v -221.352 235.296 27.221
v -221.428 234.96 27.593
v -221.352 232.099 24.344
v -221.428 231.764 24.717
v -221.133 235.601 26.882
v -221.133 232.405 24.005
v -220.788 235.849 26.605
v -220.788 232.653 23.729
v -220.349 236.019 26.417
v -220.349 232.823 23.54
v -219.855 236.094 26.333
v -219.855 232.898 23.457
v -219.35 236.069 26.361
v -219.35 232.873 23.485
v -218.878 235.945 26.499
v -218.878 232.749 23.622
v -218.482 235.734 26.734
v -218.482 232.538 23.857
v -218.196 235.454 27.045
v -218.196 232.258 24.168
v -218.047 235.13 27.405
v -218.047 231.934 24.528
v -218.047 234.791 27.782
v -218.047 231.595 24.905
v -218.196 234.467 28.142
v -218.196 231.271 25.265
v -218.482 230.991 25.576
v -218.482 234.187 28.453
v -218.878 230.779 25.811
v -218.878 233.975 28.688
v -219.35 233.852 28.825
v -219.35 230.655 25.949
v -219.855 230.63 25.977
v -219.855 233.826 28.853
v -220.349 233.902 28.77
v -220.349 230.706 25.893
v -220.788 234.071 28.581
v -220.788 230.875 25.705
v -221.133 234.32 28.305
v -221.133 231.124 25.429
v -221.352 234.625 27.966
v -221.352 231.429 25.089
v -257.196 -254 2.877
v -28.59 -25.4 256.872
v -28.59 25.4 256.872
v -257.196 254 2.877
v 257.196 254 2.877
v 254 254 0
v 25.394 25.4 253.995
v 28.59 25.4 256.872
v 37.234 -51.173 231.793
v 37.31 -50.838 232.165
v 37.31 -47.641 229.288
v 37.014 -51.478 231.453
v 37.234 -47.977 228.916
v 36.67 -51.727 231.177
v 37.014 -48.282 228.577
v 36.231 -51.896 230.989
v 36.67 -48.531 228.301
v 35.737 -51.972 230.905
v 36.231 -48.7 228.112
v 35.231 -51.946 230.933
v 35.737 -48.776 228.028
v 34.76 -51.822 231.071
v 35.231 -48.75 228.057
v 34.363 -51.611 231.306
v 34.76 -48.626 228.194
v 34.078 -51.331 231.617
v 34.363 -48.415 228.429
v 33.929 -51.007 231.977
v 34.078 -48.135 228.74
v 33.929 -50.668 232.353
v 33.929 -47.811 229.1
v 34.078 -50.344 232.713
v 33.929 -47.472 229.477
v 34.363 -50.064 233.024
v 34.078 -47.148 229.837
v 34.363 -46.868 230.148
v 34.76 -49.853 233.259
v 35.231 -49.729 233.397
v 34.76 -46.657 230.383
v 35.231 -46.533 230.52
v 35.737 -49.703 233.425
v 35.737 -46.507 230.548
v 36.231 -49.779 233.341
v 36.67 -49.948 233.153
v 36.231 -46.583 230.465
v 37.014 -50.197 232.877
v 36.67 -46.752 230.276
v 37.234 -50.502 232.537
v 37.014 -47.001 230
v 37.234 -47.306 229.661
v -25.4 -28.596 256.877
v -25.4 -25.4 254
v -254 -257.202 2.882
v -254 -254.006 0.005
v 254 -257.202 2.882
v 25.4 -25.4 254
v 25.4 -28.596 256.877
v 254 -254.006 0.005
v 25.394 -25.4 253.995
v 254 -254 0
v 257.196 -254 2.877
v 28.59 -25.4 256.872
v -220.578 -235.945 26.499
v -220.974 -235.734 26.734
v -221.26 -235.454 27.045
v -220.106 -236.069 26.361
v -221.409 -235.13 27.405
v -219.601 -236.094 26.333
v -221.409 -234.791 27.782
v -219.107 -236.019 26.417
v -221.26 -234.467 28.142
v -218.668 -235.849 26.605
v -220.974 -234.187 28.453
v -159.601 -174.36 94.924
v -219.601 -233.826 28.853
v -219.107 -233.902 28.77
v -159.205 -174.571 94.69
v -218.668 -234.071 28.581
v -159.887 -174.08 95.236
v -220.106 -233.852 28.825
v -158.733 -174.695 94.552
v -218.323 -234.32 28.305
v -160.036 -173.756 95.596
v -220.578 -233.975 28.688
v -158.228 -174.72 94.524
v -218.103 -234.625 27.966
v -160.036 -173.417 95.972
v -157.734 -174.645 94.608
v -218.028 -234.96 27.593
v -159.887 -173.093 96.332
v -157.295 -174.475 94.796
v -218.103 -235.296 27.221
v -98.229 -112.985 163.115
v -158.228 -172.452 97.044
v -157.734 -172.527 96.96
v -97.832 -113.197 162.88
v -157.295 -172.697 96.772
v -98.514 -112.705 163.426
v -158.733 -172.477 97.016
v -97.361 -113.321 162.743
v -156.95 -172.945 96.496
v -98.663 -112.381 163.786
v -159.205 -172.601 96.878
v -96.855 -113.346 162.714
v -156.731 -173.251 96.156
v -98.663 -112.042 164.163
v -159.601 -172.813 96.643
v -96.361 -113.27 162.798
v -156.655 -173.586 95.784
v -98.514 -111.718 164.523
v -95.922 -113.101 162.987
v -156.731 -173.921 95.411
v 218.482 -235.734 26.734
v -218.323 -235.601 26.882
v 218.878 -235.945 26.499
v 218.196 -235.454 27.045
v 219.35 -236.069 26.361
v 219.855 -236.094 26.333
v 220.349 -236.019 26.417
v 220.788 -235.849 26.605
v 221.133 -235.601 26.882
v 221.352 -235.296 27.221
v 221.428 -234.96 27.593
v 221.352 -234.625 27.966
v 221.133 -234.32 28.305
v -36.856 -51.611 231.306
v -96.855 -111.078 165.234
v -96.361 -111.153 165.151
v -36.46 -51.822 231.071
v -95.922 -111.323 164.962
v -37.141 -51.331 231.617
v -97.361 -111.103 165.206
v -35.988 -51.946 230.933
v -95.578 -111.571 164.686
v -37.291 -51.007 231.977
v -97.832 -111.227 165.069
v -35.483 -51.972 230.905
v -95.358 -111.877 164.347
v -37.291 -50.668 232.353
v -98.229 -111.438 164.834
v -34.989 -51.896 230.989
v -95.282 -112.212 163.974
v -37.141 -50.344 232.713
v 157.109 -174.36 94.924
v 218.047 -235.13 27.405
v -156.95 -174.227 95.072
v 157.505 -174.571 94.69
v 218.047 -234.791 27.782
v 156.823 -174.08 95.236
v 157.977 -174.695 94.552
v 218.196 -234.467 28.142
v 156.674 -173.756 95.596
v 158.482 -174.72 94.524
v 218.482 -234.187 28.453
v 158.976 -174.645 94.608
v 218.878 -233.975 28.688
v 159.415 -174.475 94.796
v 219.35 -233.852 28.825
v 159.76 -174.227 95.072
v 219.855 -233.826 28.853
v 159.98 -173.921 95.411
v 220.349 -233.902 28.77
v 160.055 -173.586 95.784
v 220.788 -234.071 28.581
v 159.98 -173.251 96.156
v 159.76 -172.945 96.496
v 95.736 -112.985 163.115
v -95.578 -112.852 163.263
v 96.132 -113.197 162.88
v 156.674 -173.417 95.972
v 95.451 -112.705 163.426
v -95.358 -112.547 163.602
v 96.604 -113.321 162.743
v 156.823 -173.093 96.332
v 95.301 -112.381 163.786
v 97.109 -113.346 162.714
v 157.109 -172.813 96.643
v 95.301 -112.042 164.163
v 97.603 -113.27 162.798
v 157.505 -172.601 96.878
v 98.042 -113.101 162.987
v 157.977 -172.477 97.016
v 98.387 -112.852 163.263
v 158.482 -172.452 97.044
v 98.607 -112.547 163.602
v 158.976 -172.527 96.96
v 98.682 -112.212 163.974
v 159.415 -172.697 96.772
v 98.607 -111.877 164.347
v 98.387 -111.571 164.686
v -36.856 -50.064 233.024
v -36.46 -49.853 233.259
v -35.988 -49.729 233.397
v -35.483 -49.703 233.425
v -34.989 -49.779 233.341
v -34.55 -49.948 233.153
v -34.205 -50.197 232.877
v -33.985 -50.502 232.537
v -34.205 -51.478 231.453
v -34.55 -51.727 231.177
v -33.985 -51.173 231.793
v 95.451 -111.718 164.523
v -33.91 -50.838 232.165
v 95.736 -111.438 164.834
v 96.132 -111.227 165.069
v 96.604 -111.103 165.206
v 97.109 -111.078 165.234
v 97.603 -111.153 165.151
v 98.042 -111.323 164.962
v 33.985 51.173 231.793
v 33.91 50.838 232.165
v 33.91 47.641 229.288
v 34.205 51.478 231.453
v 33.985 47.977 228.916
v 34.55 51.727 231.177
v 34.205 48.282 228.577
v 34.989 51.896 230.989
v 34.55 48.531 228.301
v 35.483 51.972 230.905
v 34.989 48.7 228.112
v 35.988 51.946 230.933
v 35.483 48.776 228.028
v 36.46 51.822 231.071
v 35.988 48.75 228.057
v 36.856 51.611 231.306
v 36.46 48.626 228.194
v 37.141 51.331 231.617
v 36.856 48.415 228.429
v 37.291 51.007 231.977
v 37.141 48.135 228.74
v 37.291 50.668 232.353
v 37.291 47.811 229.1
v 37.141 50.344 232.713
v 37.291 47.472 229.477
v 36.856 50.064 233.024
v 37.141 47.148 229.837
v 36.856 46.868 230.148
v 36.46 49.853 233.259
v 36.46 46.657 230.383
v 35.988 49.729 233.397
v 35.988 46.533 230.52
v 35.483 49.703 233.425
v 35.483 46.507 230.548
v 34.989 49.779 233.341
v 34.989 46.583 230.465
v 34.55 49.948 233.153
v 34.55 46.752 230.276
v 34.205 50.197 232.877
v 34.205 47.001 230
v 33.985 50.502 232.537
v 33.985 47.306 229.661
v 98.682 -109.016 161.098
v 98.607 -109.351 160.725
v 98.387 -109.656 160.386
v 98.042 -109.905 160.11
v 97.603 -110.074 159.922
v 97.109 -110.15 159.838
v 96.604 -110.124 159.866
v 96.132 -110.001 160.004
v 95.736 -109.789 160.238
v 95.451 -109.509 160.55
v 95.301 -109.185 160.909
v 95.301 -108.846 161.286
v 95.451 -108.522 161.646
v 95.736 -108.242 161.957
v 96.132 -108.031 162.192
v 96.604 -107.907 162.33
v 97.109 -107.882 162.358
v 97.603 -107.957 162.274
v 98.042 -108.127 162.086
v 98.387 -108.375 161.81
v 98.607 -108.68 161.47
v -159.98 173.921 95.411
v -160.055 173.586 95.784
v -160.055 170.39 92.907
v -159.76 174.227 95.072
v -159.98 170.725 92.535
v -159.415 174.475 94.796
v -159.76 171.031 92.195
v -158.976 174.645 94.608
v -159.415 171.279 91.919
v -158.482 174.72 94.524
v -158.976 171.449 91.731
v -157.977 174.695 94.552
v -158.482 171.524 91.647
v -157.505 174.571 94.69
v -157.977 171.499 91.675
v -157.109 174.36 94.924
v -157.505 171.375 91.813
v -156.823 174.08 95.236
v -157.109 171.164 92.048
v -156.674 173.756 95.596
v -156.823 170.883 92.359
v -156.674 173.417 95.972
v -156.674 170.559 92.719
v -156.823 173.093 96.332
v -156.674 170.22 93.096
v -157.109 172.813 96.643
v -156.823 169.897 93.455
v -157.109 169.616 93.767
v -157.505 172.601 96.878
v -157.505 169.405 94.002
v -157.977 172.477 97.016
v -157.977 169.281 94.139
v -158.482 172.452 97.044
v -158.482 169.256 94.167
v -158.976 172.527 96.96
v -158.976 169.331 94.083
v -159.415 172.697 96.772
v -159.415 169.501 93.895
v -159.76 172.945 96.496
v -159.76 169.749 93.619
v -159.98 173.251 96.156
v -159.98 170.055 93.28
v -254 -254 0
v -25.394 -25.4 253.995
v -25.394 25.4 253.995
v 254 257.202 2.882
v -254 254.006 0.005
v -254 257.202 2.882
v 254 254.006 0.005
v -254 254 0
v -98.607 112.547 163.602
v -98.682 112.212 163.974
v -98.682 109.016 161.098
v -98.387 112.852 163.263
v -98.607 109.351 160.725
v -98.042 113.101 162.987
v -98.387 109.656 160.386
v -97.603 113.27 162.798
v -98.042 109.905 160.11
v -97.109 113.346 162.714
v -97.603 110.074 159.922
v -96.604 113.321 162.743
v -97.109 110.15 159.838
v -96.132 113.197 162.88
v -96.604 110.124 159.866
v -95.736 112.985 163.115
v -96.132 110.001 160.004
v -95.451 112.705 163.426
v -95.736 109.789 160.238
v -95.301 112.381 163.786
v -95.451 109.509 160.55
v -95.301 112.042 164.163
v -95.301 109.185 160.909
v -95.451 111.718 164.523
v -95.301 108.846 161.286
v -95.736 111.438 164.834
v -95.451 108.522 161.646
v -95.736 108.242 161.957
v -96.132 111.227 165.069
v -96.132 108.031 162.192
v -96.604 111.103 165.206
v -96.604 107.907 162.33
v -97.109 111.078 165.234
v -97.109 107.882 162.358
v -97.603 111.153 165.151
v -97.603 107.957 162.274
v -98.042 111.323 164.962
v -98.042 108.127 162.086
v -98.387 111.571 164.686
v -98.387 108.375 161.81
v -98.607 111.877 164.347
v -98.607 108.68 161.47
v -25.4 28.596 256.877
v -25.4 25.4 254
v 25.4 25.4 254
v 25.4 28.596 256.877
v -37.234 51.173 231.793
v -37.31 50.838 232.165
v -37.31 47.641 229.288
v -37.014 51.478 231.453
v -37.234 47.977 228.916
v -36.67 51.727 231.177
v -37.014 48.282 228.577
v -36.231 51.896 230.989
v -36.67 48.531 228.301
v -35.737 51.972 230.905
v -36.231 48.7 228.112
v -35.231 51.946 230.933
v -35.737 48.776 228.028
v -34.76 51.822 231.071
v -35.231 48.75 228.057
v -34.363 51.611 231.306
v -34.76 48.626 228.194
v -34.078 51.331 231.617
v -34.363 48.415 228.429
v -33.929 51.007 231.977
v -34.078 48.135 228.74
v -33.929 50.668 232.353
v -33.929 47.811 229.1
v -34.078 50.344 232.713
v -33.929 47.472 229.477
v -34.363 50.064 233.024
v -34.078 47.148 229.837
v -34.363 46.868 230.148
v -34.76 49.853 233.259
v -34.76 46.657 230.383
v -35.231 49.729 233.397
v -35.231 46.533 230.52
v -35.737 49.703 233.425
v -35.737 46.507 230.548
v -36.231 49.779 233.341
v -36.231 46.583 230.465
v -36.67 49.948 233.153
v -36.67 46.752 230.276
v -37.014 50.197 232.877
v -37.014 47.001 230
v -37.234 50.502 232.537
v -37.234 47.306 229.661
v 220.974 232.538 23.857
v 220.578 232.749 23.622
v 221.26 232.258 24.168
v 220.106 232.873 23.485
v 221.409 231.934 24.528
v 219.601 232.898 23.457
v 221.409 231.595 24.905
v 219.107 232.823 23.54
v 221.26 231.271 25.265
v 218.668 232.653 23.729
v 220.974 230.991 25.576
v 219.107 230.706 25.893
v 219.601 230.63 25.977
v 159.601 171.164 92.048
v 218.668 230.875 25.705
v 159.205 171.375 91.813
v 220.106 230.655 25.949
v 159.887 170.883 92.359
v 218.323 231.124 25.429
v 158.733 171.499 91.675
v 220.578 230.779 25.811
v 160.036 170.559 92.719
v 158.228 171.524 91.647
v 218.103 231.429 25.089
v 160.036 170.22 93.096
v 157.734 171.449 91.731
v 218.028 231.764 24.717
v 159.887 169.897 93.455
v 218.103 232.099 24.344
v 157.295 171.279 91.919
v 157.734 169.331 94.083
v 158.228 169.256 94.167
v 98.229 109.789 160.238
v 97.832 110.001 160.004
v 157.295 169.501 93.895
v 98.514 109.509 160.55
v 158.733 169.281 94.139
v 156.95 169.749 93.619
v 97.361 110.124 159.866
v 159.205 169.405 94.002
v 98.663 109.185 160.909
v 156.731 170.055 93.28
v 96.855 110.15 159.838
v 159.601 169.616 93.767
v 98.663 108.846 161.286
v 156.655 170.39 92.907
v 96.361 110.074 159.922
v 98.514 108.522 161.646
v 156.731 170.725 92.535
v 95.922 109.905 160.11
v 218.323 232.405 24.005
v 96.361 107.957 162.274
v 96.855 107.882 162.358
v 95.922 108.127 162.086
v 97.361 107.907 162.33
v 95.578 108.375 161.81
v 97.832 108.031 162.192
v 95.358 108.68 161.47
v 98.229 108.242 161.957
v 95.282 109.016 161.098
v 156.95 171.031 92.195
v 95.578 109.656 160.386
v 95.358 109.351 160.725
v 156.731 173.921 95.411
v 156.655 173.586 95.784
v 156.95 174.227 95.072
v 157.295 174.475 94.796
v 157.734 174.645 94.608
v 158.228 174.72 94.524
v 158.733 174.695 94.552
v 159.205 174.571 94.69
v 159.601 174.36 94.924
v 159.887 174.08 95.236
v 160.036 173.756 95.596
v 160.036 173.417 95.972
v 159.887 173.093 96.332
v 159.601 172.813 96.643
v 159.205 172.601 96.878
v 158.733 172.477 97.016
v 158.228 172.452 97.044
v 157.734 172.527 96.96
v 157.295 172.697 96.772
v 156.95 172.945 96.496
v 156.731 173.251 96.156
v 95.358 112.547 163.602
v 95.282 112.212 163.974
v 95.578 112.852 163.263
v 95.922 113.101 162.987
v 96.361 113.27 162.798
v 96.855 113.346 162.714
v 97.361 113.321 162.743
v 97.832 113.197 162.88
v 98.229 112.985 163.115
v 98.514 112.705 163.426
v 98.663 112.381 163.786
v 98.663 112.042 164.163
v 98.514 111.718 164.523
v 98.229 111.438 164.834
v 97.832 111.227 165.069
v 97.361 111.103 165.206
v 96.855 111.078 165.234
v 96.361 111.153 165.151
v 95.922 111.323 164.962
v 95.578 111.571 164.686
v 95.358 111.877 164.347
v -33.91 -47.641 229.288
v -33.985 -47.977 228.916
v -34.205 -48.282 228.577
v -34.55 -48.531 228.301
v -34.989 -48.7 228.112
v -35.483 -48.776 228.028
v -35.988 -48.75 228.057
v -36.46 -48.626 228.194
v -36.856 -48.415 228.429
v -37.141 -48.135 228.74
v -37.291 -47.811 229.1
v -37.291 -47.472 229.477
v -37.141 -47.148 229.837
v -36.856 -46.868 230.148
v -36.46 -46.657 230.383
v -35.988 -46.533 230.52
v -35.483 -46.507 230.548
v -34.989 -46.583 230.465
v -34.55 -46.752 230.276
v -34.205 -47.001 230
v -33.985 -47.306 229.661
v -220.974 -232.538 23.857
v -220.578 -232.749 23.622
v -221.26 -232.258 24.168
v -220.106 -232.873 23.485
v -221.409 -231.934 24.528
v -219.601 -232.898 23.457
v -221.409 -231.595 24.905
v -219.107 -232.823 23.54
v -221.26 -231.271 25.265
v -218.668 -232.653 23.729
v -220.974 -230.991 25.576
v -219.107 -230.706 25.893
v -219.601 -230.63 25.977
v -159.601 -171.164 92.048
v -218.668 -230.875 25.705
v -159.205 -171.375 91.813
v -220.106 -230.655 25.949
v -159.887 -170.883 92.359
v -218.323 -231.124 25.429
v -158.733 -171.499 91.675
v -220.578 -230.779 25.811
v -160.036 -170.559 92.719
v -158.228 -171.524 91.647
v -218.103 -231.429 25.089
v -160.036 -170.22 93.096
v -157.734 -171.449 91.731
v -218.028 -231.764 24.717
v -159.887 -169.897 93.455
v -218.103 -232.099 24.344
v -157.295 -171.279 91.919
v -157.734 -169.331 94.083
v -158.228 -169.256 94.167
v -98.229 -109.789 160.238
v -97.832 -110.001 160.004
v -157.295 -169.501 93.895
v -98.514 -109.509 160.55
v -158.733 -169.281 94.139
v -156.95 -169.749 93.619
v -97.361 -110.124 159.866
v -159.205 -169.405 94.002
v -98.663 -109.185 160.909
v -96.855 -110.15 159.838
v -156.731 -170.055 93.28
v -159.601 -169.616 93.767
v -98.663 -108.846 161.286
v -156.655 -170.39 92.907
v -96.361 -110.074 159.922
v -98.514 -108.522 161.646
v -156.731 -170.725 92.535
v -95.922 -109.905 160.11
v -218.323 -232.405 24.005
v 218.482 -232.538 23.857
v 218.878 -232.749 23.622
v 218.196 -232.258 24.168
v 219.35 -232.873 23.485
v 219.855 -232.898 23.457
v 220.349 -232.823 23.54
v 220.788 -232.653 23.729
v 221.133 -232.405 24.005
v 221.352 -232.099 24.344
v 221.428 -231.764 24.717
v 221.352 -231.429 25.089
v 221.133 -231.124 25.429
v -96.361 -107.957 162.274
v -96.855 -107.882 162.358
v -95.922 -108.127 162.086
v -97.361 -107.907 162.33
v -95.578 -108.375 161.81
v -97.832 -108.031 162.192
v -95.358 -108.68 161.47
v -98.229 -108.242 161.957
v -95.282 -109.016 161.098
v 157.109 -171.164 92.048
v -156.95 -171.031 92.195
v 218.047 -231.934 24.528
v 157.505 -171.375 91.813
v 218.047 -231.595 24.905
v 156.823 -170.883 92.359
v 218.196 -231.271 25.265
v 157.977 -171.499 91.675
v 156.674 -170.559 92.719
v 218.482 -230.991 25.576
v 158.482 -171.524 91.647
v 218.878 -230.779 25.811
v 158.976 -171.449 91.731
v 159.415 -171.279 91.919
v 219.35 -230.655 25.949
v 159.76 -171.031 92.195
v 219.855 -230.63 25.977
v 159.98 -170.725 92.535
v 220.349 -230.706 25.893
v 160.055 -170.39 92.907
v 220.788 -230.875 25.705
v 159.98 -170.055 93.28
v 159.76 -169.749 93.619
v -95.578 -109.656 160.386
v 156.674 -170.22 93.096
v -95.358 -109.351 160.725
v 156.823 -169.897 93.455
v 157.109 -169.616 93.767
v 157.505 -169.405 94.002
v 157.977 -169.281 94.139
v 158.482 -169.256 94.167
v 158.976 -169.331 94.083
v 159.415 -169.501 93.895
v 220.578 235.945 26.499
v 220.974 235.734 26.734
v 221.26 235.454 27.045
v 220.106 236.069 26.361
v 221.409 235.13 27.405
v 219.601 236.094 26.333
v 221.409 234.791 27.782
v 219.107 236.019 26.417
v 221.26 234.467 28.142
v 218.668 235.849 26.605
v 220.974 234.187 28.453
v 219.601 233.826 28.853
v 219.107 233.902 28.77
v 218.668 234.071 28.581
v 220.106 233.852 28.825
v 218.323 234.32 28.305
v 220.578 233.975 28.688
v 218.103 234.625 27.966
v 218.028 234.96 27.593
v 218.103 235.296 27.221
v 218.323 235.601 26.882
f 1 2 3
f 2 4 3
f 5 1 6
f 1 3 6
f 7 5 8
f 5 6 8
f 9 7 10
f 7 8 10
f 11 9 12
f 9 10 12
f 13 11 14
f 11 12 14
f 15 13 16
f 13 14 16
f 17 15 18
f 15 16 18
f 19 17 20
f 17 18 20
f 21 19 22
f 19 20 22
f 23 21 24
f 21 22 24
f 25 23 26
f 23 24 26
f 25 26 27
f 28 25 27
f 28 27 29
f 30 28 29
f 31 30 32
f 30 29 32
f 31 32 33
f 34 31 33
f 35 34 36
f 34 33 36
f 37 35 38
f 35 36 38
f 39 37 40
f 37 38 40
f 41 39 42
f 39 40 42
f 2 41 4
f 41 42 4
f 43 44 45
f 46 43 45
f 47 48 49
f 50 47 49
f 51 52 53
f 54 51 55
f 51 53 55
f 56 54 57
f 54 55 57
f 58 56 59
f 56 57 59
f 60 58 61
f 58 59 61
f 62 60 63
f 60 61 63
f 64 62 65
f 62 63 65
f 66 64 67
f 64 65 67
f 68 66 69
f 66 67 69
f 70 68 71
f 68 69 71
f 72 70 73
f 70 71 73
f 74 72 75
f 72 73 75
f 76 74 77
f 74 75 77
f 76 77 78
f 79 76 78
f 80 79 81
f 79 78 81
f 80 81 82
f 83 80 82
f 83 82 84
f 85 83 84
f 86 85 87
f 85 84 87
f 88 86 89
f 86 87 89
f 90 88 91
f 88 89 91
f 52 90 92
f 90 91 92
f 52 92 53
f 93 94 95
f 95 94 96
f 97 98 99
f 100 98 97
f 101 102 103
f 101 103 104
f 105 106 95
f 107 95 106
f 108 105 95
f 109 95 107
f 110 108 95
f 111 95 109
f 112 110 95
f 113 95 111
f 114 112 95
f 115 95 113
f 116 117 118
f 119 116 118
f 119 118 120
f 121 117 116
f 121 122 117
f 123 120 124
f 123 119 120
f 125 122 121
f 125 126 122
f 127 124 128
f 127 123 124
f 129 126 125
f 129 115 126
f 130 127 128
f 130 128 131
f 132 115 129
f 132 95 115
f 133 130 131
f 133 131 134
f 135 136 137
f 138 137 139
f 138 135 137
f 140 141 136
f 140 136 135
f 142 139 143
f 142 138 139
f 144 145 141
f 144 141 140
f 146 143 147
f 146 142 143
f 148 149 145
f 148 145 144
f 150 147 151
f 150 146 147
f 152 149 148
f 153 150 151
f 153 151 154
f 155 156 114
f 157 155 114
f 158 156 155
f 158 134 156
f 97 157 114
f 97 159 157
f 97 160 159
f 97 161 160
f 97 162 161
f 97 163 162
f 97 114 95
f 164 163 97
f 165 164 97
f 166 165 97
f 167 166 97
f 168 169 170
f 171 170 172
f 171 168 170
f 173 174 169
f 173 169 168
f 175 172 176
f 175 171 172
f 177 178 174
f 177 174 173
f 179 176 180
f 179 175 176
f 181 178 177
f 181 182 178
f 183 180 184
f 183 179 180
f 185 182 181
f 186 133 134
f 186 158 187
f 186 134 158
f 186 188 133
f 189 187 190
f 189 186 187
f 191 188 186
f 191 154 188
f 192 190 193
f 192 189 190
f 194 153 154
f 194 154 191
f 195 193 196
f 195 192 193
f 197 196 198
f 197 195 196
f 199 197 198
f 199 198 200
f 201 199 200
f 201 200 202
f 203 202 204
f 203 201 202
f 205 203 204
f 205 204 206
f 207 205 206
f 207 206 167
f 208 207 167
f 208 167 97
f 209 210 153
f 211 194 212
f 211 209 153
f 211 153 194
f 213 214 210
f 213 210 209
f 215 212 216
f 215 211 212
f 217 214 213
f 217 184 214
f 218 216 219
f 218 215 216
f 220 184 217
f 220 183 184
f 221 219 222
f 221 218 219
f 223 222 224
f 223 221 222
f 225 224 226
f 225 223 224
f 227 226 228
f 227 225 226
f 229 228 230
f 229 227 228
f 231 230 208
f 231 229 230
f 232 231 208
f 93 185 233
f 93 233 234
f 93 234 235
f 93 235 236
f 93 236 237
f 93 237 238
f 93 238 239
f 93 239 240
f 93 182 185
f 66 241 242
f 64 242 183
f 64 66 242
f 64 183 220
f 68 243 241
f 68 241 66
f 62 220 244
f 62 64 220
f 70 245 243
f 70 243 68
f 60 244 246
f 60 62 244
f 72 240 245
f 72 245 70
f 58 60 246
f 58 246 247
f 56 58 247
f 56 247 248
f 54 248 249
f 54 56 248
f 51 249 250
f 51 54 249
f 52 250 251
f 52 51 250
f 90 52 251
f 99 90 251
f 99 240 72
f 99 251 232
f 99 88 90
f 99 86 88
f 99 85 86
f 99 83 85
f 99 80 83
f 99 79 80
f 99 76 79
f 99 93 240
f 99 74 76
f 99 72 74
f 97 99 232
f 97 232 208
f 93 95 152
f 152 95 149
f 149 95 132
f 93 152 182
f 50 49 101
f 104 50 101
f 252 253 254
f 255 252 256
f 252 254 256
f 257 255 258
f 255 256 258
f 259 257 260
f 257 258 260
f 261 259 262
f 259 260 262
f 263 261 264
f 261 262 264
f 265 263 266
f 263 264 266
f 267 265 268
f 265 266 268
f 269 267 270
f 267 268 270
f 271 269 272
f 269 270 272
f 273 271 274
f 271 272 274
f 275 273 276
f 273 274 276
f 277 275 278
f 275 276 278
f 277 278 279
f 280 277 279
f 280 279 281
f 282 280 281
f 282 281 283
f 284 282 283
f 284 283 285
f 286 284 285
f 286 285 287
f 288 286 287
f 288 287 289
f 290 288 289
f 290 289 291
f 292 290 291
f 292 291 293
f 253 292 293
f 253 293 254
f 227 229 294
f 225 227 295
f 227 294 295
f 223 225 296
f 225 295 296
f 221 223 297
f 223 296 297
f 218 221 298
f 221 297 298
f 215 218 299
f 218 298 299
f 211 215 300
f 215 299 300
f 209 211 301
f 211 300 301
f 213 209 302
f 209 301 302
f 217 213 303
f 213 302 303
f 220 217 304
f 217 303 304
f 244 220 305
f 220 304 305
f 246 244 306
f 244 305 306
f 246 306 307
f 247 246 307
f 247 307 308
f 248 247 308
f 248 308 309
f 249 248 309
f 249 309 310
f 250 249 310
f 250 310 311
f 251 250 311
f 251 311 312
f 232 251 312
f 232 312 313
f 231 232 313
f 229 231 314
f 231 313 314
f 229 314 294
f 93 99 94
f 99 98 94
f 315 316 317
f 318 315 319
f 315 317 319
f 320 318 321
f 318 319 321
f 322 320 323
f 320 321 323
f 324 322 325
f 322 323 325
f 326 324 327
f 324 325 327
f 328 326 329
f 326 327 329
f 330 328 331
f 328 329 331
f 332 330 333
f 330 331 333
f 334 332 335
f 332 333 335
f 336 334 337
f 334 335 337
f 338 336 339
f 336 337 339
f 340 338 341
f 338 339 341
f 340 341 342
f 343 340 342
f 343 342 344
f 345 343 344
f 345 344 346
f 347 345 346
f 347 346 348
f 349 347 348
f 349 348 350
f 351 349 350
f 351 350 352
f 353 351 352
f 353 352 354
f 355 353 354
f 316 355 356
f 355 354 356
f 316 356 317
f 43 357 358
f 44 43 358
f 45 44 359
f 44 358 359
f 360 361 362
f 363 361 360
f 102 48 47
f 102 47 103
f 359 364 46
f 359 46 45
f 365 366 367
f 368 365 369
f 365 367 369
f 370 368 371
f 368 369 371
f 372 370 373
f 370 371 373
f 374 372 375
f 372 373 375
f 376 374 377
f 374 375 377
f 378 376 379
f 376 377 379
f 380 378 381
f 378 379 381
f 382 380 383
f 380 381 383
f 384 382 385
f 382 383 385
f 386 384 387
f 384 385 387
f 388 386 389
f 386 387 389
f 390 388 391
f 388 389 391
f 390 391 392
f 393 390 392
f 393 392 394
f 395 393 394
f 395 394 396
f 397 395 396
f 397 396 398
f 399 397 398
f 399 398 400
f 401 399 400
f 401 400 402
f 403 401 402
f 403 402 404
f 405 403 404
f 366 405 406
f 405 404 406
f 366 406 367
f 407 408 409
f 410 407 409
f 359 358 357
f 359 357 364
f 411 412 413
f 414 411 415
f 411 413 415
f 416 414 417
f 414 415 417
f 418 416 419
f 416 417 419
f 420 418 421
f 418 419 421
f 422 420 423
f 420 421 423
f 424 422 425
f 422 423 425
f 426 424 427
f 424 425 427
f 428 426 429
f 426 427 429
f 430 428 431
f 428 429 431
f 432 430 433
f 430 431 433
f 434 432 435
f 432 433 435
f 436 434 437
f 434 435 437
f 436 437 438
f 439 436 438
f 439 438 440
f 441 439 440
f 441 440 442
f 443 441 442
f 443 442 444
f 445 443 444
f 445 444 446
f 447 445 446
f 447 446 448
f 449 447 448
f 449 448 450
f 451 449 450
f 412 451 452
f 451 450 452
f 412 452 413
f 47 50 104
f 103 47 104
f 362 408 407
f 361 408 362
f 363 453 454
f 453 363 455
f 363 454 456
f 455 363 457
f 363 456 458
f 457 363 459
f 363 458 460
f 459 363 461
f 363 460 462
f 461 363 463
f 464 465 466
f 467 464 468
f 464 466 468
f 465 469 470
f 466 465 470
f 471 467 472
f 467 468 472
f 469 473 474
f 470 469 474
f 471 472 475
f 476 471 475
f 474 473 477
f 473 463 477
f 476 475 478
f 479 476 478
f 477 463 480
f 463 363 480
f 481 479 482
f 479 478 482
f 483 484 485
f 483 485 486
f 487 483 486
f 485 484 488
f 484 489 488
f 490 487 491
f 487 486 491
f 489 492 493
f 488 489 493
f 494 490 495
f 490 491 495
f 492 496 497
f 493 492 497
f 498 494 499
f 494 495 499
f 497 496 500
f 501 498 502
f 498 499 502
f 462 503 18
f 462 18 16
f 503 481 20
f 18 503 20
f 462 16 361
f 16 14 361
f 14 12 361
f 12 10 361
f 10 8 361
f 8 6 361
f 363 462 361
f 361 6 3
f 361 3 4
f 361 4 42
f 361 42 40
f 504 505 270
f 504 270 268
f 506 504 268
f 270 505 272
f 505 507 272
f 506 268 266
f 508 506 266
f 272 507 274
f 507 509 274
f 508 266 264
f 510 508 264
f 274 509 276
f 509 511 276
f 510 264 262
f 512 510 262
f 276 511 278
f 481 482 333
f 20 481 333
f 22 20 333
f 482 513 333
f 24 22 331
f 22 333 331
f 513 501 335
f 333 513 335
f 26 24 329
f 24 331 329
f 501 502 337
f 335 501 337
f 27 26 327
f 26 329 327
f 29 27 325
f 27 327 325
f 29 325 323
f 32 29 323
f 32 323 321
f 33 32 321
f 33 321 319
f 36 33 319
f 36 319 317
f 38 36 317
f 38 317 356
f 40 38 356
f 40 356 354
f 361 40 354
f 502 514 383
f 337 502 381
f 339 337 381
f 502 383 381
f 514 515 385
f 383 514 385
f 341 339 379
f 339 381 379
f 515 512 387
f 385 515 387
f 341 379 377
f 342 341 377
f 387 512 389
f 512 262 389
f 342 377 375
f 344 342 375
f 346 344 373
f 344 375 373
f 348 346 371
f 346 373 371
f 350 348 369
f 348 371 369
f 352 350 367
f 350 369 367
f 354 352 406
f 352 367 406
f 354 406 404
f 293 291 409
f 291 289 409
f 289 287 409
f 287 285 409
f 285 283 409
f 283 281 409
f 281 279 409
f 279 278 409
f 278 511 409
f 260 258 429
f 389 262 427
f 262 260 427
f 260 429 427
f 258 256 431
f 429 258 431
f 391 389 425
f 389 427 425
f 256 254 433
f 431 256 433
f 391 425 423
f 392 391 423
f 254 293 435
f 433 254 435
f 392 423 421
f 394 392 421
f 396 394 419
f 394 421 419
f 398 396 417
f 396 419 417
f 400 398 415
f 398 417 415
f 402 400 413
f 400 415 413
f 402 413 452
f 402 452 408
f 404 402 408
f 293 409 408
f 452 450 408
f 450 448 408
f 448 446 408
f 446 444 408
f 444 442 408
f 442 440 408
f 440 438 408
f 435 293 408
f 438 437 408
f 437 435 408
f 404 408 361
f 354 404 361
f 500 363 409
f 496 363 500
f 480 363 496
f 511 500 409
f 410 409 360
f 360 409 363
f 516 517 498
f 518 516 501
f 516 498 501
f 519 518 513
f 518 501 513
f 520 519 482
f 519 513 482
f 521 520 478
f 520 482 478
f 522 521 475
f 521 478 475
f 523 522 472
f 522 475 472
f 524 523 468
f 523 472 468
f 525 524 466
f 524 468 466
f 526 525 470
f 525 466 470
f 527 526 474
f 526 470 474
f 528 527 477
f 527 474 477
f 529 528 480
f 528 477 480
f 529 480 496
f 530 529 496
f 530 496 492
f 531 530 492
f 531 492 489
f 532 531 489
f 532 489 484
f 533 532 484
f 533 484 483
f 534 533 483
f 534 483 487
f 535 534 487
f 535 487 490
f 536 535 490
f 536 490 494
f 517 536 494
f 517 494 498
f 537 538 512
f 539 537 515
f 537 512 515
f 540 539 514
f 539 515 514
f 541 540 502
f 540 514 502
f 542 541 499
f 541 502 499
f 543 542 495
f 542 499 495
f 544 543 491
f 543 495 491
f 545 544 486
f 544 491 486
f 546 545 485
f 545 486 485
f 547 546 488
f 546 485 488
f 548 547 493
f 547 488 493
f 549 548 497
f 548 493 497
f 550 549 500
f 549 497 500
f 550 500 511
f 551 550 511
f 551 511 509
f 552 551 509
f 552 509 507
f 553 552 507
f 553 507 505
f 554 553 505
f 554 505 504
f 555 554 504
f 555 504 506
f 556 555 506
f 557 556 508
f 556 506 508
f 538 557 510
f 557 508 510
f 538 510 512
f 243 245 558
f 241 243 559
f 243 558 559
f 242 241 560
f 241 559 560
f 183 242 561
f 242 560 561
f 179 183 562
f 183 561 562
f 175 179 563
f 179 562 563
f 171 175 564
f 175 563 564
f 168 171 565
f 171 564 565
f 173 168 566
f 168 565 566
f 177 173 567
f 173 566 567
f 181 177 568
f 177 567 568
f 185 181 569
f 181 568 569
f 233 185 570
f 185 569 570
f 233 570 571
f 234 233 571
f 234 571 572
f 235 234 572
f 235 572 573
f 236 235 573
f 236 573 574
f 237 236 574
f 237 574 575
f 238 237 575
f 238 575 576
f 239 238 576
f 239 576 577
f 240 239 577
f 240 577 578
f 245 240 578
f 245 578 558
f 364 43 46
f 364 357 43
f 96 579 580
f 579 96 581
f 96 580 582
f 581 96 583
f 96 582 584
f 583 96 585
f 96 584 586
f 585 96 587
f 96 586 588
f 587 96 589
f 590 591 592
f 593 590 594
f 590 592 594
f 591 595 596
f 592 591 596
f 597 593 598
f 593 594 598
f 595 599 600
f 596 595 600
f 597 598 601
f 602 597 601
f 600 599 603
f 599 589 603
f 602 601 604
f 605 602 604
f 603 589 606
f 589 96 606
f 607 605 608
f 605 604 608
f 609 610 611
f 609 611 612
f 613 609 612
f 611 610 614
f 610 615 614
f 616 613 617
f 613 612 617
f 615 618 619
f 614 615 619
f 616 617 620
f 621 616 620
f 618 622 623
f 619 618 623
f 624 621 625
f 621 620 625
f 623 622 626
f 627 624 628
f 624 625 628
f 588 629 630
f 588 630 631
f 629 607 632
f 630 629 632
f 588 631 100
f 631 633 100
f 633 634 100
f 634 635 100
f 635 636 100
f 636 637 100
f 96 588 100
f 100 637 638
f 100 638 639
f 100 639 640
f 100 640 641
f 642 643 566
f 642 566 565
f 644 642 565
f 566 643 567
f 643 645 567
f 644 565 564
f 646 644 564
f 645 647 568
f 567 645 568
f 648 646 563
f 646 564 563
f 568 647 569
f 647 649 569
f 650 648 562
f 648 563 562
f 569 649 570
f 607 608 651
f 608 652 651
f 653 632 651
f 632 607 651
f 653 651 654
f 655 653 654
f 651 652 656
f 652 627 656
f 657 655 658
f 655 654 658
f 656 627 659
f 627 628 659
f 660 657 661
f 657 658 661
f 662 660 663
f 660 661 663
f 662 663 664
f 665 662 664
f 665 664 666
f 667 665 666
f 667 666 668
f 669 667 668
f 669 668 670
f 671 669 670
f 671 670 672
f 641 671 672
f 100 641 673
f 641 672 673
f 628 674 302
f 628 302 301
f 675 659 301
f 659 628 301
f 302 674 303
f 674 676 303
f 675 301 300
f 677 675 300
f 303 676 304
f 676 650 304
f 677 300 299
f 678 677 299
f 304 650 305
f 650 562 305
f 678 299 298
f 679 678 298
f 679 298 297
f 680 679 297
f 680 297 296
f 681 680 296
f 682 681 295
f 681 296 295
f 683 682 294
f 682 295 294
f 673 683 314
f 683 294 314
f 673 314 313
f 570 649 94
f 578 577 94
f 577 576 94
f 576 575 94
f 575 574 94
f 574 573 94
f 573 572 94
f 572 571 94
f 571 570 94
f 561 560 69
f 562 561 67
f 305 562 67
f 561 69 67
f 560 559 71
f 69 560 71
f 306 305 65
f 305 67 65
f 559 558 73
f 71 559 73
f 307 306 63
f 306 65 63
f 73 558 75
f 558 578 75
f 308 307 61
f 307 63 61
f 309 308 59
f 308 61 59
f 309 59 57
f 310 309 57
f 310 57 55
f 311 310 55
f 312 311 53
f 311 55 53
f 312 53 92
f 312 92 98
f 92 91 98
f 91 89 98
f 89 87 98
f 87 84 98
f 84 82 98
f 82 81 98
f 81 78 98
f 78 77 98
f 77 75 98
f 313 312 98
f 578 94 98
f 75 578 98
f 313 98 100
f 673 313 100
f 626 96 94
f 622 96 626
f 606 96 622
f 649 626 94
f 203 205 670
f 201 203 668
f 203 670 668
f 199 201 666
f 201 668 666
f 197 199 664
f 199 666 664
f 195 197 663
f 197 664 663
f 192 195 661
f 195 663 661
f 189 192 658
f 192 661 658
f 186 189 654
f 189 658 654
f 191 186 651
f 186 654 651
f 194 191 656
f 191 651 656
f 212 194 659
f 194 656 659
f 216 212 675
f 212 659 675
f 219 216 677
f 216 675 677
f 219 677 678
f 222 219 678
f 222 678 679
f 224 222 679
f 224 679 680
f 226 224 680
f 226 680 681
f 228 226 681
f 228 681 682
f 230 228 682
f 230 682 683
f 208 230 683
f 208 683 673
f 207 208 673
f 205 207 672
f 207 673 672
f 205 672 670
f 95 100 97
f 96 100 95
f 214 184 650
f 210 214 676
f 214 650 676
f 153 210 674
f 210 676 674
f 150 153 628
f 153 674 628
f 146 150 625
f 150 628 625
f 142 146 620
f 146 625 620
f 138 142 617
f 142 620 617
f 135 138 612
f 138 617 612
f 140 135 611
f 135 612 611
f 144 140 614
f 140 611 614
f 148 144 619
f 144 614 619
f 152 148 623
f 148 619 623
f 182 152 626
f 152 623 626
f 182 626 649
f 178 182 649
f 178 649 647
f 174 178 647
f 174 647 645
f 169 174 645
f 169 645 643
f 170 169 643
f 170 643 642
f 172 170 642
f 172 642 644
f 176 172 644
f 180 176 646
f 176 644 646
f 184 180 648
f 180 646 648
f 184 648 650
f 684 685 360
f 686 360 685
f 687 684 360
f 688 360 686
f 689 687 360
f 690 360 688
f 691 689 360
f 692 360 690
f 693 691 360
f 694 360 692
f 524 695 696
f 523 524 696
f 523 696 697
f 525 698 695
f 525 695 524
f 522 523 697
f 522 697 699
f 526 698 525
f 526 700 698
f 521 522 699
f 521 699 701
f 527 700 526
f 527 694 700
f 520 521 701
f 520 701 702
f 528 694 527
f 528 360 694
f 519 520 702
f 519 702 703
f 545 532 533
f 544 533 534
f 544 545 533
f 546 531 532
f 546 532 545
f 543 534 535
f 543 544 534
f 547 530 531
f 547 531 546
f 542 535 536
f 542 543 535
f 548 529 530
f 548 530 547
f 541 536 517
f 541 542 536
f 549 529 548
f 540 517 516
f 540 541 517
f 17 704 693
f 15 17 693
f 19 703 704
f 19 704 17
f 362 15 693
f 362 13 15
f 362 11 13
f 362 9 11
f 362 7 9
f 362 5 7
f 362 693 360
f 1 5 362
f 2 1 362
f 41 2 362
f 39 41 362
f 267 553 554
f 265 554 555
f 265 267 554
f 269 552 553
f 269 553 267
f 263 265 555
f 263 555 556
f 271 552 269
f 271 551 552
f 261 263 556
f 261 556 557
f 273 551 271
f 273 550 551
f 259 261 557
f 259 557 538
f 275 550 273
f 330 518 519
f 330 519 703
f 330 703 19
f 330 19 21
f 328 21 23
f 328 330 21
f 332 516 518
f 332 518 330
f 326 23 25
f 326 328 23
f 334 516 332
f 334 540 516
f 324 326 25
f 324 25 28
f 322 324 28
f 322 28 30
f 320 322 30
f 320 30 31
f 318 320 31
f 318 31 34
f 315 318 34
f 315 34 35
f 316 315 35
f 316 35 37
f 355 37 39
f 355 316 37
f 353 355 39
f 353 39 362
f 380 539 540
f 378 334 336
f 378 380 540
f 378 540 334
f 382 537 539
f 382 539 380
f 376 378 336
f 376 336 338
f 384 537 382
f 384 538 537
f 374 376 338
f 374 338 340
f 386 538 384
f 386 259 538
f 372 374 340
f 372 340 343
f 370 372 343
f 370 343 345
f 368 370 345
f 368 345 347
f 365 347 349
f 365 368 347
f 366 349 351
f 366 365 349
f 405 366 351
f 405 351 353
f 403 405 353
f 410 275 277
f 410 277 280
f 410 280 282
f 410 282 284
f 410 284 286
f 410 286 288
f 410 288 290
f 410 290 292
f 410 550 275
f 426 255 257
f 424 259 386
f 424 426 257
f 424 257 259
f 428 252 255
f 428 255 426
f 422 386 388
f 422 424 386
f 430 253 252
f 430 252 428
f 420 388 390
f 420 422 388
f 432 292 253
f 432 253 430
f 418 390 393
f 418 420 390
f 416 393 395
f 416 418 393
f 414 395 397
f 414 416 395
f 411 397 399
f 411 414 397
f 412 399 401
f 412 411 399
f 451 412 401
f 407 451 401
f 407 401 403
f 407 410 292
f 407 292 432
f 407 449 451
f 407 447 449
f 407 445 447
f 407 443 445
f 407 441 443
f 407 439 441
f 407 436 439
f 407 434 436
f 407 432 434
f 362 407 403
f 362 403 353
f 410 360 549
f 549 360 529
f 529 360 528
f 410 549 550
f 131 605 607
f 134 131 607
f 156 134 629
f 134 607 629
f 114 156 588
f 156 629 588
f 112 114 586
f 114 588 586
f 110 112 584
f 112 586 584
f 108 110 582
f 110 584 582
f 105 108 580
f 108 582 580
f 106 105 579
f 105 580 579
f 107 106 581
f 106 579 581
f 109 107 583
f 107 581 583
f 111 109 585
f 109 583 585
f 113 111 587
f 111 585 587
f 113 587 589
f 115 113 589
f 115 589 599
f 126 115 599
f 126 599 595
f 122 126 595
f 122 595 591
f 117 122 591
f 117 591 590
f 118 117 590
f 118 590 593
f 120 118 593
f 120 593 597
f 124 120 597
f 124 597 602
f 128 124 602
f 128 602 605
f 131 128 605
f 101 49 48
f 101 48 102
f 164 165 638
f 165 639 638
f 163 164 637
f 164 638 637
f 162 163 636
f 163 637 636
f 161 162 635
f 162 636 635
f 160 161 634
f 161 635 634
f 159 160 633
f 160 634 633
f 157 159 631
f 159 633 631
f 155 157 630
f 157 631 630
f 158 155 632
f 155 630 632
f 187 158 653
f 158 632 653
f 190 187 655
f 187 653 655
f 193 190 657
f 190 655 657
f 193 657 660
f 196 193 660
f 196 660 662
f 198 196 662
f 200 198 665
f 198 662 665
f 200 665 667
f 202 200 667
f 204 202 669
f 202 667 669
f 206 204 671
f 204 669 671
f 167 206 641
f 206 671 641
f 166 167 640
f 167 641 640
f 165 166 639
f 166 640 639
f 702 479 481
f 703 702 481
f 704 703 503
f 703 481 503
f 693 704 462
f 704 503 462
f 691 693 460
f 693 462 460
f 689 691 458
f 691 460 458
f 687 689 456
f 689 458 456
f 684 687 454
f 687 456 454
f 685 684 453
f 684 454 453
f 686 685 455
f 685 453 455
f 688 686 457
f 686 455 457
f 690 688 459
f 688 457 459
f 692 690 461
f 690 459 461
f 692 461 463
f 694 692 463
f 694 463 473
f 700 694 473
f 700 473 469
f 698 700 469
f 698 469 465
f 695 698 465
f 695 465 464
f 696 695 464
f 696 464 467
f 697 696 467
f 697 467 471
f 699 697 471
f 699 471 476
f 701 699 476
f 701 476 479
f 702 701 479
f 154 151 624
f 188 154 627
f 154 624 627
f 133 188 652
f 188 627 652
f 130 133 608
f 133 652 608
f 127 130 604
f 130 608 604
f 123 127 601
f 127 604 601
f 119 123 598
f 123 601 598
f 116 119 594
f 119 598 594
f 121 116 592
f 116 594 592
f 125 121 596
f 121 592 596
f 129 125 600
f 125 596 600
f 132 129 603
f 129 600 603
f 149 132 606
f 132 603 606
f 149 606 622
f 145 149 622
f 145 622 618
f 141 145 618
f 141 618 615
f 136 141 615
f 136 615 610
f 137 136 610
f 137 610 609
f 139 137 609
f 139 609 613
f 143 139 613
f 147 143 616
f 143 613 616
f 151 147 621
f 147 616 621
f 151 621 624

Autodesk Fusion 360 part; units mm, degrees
sketch "Sketch2" plane through (0, 0, 0) normal (0, 0, 1) x (1, 0, 0)
  line L0 (254, -254) -> (-254, -254)
  line L1 (-254, -254) -> (-254, 254)
  line L2 (-254, 254) -> (254, 254)
  line L3 (254, 254) -> (254, -254)
  line L4 (254, -254) -> (-254, 254) construction
  line L5 (-254, -254) -> (254, 254) construction
  dimension "d44" = 508
  dimension "d45" = 508
ref_plane "WorkPlane1" through (0, 0, 254) normal (0, 0, 1) x (1, 0, 0)
sketch "Sketch3" plane through (0, 0, 254) normal (0, 0, 1) x (1, 0, 0)
  line L0 (25.4, -25.4) -> (-25.4, -25.4)
  line L1 (-25.4, -25.4) -> (-25.4, 25.4)
  line L2 (-25.4, 25.4) -> (25.4, 25.4)
  line L3 (25.4, 25.4) -> (25.4, -25.4)
  line L4 (25.4, -25.4) -> (-25.4, 25.4) construction
  line L5 (-25.4, -25.4) -> (25.4, 25.4) construction
  dimension "d47" = 50.8
  dimension "d48" = 50.8
ref_plane "WorkPlane2" through (-25.4, -25.4, 254) normal (0, -0.7433, 0.669) x (1, 0, 0)
sketch "Sketch4" plane through (-25.4, -25.4, 254) normal (0, -0.7433, 0.669) x (1, 0, 0)
  line L0 (50.8, 0) -> (0, 0)
  line L1 (279.4, -341.7221) -> (-228.6, -341.7221)
  line L2 (50.8, 0) -> (279.4, -341.7221)
  line L3 (0, 0) -> (-228.6, -341.7221)
  line L4 (-216.5687, -341.7221) -> (12.0313, 0)
  circle A0 centre (-194.3279, -308.4753) radius 1.7
  circle A1 centre (-10.2096, -33.2467) radius 1.7
  line L5 (-194.3279, -308.4753) -> (-10.2096, -33.2467) construction
  circle A2 centre (-132.9551, -216.7325) radius 1.7
  circle A3 centre (-71.5824, -124.9896) radius 1.7
  line L6 (25.4, -341.7221) -> (25.4, 0) construction
  circle A4 centre (245.1279, -308.4753) radius 1.7
  circle A5 centre (183.7551, -216.7325) radius 1.7
  circle A6 centre (122.3824, -124.9896) radius 1.7
  circle A7 centre (61.0096, -33.2467) radius 1.7
  point P0 (-132.9551, -216.7325)
  point P1 (-71.5824, -124.9896)
  point P2 (-10.2096, -33.2467)
  dimension "d54" = 10
  dimension "d55" = 3.4
  dimension "d56" = 40
  dimension "d57" = 3.4
  dimension "d58" = 40
  dimension "d63" = 331.1349
  dimension "d64" = 0
  dimension "d65" = 3.4
  dimension "d66" = 3.4
extrude "Extrude2" add sketch "Sketch4" along normal blind 4.3 contours L0 L1 L2 L4 A0 A1 A2 A3 | L0 L1 L3 L4 A0 A1 A2 A3 makes body 1
ref_plane "WorkPlane3" through (-254, -254, 0) normal (0.7433, 0, -0.669) x (0, 1, 0)
sketch "Sketch5" plane through (-254, -254, 0) normal (0.7433, 0, -0.669) x (0, 1, 0)
  line L0 (0, 0) -> (508, 0)
  line L1 (228.6, 341.7221) -> (279.4, 341.7221)
  line L2 (0, 0) -> (228.6, 341.7221)
  line L3 (508, 0) -> (279.4, 341.7221)
extrude "Extrude3" add sketch "Sketch5" against normal blind 4.3 separate body makes body 2
copy_body "CopyPasteBodies1" bodies 1 2 makes body 3 makes body 4
move_body "Move1" bodies 3 4 to x (-1, 0, 0) y (0, -1, 0) z (0, 0, 1) at (0, 0, 0)
sketch "Sketch6" plane through (-25.4, -25.4, 254) normal (0, -0.7433, 0.669) x (1, 0, 0)
  circle A0 centre (-132.9551, -216.7325) radius 1.7
  circle A1 centre (-194.3279, -308.4753) radius 1.7
  circle A2 centre (-10.2096, -33.2467) radius 1.7
  circle A3 centre (-71.5824, -124.9896) radius 1.7
  circle A4 centre (245.1279, -308.4753) radius 1.7
  circle A5 centre (183.7551, -216.7325) radius 1.7
  circle A6 centre (122.3824, -124.9896) radius 1.7
  circle A7 centre (61.0096, -33.2467) radius 1.7
  line L0 (50.8, 0) -> (0, 0)
  line L1 (0, 0) -> (-228.6, -341.7221)
  line L2 (-228.6, -341.7221) -> (279.4, -341.7221)
  line L3 (279.4, -341.7221) -> (50.8, 0)
